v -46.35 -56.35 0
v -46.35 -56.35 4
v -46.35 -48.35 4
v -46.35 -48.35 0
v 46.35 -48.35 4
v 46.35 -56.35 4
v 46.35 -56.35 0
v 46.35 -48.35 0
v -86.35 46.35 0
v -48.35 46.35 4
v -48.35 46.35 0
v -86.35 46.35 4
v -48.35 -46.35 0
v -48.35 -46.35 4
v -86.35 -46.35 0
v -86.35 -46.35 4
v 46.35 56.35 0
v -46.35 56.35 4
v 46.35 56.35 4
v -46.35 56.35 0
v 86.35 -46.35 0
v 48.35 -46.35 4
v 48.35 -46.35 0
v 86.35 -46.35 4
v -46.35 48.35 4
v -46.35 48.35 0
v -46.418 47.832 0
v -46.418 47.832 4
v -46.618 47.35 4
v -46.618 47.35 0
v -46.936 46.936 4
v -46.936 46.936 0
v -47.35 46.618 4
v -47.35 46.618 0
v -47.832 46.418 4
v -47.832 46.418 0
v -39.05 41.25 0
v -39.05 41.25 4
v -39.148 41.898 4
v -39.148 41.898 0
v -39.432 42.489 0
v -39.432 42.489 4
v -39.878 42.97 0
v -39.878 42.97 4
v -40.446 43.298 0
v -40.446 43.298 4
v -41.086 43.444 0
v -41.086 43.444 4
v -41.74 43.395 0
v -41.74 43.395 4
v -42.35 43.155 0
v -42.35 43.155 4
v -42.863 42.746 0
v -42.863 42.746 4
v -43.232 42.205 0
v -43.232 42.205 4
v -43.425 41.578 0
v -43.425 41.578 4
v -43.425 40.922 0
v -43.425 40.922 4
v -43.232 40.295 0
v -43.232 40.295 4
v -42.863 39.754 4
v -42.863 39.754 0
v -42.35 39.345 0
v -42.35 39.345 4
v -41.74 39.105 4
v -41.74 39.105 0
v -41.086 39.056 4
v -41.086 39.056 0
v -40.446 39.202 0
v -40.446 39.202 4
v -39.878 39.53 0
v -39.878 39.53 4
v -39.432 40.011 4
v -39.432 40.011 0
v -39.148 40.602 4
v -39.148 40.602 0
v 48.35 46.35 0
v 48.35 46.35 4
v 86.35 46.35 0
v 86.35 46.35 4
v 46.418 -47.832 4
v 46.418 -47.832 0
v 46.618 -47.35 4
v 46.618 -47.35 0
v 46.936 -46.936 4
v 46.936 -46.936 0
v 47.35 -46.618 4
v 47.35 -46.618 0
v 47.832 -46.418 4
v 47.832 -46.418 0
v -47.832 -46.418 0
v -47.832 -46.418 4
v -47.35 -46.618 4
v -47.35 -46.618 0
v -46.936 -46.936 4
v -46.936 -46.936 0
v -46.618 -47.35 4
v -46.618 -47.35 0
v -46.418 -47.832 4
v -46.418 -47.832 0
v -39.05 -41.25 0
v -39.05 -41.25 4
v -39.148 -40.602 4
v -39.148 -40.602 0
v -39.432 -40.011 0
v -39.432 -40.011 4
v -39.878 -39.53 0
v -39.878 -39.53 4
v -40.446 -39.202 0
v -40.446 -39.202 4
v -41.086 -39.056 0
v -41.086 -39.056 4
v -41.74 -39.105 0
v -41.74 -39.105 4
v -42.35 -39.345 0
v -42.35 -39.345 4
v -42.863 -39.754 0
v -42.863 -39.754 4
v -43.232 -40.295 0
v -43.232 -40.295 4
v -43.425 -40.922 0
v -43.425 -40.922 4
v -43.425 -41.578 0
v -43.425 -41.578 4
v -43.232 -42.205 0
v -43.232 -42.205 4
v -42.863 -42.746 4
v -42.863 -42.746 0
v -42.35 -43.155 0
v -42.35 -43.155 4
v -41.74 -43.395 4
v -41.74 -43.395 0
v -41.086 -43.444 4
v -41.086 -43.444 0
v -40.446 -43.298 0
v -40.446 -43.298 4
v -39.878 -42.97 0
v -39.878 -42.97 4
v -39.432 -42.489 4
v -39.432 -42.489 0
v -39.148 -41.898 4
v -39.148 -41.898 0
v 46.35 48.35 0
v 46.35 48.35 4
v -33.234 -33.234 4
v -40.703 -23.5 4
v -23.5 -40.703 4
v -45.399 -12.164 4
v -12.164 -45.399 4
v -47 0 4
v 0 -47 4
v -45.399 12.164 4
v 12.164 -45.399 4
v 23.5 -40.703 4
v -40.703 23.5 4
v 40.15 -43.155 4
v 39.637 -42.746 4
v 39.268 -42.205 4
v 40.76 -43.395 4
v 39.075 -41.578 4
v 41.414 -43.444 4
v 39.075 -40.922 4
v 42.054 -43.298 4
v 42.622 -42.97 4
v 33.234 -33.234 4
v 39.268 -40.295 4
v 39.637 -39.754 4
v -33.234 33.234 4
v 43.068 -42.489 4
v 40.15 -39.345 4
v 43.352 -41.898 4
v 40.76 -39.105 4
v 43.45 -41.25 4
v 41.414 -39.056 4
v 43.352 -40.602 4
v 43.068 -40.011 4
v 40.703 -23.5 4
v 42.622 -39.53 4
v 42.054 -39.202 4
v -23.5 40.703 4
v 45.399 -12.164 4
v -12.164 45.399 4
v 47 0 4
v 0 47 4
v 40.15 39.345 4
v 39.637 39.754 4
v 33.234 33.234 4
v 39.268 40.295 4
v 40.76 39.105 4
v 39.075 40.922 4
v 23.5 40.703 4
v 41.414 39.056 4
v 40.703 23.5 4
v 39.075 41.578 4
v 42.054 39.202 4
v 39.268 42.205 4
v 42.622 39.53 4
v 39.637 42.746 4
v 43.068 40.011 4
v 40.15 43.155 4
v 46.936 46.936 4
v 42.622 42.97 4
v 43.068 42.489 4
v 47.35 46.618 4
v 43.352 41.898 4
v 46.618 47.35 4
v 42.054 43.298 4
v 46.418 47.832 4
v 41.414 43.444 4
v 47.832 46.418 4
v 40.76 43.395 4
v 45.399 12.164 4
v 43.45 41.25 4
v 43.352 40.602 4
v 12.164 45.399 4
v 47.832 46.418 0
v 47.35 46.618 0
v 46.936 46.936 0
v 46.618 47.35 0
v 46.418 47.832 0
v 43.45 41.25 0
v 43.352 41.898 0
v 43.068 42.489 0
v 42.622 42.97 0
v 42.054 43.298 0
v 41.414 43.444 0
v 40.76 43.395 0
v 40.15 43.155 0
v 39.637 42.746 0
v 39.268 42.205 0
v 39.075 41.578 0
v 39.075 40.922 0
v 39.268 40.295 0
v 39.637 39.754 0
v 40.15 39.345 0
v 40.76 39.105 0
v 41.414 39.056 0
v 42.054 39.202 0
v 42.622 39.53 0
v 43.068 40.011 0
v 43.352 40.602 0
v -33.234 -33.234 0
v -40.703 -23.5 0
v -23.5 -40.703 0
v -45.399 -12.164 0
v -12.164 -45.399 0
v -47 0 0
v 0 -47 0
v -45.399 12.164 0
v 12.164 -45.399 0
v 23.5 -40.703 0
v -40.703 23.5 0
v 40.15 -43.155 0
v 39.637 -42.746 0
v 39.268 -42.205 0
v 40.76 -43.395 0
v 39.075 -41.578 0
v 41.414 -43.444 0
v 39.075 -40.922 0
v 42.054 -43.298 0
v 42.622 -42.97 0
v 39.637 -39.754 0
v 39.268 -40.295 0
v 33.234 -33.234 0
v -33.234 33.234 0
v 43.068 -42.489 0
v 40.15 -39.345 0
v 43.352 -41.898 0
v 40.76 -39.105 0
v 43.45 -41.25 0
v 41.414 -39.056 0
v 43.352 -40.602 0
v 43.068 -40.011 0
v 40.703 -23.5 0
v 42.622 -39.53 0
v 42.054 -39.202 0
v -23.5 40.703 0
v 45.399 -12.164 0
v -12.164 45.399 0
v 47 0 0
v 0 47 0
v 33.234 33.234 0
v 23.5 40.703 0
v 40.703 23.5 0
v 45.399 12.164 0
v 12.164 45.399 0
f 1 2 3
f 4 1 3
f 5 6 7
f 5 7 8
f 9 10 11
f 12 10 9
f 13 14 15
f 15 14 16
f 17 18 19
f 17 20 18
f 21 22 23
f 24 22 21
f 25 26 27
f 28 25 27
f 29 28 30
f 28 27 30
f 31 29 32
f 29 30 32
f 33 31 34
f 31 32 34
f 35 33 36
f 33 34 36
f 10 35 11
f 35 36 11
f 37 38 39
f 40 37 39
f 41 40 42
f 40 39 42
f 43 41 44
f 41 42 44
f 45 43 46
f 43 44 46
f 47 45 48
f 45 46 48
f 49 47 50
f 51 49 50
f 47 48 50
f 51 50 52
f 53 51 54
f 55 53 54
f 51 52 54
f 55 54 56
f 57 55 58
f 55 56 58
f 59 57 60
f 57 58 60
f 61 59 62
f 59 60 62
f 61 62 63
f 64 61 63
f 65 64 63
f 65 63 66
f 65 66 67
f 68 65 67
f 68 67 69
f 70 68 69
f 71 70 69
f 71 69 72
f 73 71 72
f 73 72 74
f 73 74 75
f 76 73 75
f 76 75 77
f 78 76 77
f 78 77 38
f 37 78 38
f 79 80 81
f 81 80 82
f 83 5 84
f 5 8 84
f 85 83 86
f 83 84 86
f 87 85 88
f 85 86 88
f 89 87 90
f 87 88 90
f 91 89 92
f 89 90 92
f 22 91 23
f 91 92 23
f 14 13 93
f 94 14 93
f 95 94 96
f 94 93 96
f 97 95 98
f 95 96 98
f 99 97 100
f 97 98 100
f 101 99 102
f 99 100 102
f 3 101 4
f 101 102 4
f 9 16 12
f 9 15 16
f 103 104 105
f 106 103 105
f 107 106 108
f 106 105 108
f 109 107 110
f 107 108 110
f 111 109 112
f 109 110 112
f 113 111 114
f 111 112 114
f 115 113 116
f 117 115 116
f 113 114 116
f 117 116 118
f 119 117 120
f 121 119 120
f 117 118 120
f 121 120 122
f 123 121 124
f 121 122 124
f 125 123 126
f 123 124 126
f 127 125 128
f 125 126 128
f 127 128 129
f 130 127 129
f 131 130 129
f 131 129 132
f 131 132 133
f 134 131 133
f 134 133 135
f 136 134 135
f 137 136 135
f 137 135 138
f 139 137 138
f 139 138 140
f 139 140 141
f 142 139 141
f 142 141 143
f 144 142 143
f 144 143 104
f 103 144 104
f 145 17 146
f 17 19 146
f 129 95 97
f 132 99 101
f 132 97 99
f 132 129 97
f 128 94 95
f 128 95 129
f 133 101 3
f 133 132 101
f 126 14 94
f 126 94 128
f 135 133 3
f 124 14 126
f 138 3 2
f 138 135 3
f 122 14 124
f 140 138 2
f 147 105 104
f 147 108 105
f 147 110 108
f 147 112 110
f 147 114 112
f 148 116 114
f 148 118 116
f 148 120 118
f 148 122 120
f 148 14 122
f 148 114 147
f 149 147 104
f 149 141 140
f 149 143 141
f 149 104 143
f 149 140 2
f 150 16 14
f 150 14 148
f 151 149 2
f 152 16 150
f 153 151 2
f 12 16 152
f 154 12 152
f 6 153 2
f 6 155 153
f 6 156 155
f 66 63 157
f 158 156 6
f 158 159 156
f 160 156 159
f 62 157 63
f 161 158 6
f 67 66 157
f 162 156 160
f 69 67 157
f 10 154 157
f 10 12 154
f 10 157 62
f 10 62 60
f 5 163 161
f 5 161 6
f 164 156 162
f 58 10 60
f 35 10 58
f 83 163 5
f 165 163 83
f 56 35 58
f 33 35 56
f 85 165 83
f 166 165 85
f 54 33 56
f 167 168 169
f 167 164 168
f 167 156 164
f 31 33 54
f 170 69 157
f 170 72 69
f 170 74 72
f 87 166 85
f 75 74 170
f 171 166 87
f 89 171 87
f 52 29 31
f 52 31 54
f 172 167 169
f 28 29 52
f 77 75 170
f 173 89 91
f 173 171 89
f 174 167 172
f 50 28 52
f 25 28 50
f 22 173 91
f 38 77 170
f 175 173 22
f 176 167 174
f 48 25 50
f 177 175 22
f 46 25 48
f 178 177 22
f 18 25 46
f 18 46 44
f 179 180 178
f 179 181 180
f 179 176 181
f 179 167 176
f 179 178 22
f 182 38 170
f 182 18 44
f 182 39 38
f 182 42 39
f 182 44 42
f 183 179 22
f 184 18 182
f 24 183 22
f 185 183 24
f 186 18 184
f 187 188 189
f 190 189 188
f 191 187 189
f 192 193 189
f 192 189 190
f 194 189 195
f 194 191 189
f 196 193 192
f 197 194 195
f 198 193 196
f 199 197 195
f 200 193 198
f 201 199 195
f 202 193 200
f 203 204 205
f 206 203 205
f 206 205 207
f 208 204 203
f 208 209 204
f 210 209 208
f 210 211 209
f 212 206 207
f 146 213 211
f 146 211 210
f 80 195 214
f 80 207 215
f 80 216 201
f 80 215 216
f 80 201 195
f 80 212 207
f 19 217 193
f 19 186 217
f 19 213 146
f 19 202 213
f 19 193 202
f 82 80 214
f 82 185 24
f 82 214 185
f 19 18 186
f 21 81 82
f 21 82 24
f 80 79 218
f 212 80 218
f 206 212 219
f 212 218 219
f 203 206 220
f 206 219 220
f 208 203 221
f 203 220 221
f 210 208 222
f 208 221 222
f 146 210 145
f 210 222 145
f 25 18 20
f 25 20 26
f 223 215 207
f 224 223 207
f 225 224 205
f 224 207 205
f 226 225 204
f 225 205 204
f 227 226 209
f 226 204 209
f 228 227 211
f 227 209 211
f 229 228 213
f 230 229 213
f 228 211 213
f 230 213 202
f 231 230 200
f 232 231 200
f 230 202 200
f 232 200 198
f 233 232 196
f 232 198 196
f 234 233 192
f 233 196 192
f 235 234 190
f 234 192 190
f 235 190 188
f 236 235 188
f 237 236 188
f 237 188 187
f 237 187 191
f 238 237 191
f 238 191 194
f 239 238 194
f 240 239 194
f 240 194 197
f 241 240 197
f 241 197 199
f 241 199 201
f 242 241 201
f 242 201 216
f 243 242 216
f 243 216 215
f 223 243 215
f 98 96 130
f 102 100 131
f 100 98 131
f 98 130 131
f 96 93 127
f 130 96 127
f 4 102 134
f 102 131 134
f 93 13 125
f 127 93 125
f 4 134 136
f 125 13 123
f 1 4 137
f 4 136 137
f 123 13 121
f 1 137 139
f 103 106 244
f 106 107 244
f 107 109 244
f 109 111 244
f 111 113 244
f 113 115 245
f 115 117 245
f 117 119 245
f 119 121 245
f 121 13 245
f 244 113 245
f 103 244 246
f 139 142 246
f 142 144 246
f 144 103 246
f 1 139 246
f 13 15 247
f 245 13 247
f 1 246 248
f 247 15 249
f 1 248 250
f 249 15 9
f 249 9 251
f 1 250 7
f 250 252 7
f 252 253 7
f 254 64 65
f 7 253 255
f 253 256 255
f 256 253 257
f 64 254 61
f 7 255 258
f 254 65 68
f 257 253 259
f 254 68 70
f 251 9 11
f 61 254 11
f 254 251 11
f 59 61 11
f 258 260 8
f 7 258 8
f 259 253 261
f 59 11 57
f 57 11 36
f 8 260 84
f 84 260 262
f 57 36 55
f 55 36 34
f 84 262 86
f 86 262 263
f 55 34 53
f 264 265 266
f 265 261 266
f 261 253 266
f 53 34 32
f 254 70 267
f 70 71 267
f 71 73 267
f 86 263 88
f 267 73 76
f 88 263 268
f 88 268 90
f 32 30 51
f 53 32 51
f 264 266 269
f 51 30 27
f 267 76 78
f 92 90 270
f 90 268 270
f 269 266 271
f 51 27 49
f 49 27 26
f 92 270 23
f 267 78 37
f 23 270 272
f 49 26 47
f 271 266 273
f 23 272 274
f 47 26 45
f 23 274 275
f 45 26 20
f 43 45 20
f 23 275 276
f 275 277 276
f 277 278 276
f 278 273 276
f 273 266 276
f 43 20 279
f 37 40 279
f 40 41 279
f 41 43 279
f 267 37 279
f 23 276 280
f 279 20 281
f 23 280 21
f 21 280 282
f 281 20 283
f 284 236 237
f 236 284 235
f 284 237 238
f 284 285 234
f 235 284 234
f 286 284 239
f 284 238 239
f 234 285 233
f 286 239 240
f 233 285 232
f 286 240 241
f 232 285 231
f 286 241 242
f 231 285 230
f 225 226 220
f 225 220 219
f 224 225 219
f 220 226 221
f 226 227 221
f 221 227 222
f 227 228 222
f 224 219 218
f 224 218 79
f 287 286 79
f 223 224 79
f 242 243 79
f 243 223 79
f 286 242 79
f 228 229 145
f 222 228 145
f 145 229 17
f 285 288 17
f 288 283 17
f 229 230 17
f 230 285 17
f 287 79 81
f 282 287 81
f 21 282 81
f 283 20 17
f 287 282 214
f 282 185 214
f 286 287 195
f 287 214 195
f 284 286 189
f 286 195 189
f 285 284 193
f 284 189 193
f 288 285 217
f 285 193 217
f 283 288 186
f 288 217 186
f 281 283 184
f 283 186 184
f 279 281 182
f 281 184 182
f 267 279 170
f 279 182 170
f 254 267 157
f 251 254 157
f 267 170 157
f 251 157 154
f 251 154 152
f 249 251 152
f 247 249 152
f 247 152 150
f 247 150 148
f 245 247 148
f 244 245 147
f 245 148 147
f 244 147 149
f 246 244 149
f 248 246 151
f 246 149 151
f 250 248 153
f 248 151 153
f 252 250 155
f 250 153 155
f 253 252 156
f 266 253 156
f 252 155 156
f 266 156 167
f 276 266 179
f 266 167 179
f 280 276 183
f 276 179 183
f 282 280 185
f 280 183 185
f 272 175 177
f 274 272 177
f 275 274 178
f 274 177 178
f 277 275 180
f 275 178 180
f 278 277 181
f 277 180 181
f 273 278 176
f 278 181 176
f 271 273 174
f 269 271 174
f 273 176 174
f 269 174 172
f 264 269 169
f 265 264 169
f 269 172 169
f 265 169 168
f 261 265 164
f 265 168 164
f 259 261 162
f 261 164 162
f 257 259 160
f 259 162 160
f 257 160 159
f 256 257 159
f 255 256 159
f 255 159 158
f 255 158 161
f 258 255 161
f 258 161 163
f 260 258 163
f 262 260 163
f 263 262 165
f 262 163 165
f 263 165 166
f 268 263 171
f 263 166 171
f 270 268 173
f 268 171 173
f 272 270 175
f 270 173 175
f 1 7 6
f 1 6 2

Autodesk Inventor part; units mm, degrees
ref_plane "YZ Plane" through (0, 0, 0) normal (1, 0, 0) x (0, 1, 0)
ref_plane "XZ Plane" through (0, 0, 0) normal (0, 1, 0) x (-1, 0, 0)
ref_plane "XY Plane" through (0, 0, 0) normal (0, 0, 1) x (1, 0, 0)
sketch "Skizze1" plane through (0, 0, 0) normal (0, 0, 1) x (1, 0, 0)
  line L0 (-86.35, 56.35) -> (86.35, 56.35)
  line L1 (86.35, 56.35) -> (86.35, -56.35)
  line L2 (86.35, -56.35) -> (-86.35, -56.35)
  line L3 (-86.35, -56.35) -> (-86.35, 56.35)
  line L4 (-86.35, 56.35) -> (86.35, -56.35) construction
  line L5 (86.35, 56.35) -> (-86.35, -56.35) construction
  point P0 (0, 0)
  dimension "d0" = 172.7
  dimension "d1" = 112.7
extrude "Extrusion1" add sketch "Skizze1" along normal blind 4
sketch "Skizze2" plane through (0, 0, 4) normal (0, 0, 1) x (1, 0, 0)
  circle A0 centre (0, 0) radius 47
  dimension "d4" = 94
extrude "Extrusion2" cut sketch "Skizze2" against normal blind 4
sketch "Skizze3" plane through (0, 0, 4) normal (0, 0, 1) x (1, 0, 0)
  circle A0 centre (-41.25, 41.25) radius 2.2
  circle A1 centre (41.25, 41.25) radius 2.2
  circle A2 centre (41.25, -41.25) radius 2.2
  circle A3 centre (-41.25, -41.25) radius 2.2
  point P0 (0, 0)
  dimension "d7" = 82.5
  dimension "d8" = 82.5
  dimension "d9" = 82.5
  dimension "d10" = 82.5
  dimension "d11" = 41.25
  dimension "d12" = 41.25
  dimension "d13" = 41.25
  dimension "d14" = 41.25
  dimension "d15" = 4.4
  dimension "d16" = 4.4
  dimension "d17" = 4.4
  dimension "d18" = 4.4
extrude "Extrusion3" cut sketch "Skizze3" against normal blind 4
sketch "Skizze4" plane through (0, 0, 4) normal (0, 0, 1) x (1, 0, 0)
  line L0 (-86.35, 56.35) -> (-46.35, 56.35)
  line L1 (-46.35, 56.35) -> (-46.35, 46.35)
  line L2 (-46.35, 46.35) -> (-86.35, 46.35)
  line L3 (-86.35, 46.35) -> (-86.35, 56.35)
  line L4 (86.35, -56.35) -> (86.35, 56.35) projected
  line L5 (86.35, 56.35) -> (46.35, 56.35)
  line L6 (46.35, 56.35) -> (46.35, 46.35)
  line L7 (46.35, 46.35) -> (86.35, 46.35)
  line L8 (86.35, 46.35) -> (86.35, 56.35)
  line L9 (86.35, -56.35) -> (46.35, -56.35)
  line L10 (46.35, -56.35) -> (46.35, -46.35)
  line L11 (46.35, -46.35) -> (86.35, -46.35)
  line L12 (86.35, -46.35) -> (86.35, -56.35)
  line L13 (-86.35, -56.35) -> (86.35, -56.35) projected
  line L14 (-86.35, -56.35) -> (-46.35, -56.35)
  line L15 (-46.35, -56.35) -> (-46.35, -46.35)
  line L16 (-46.35, -46.35) -> (-86.35, -46.35)
  line L17 (-86.35, -46.35) -> (-86.35, -56.35)
  line L18 (-86.35, 56.35) -> (-86.35, -56.35) projected
  point P0 (86.35, -46.35)
  point P1 (86.35, 46.35)
  dimension "d31" = 40
  dimension "d32" = 40
  dimension "d33" = 10
  dimension "d34" = 10
extrude "Extrusion4" cut sketch "Skizze4" against normal blind 10
fillet "Rundung1" radius 2 4 edges at (-46.35, 46.35, 2) (46.35, 46.35, 2) (46.35, -46.35, 2) (-46.35, -46.35, 2)
properties part number "Schutzglas_Lüfter" material "Glas"
